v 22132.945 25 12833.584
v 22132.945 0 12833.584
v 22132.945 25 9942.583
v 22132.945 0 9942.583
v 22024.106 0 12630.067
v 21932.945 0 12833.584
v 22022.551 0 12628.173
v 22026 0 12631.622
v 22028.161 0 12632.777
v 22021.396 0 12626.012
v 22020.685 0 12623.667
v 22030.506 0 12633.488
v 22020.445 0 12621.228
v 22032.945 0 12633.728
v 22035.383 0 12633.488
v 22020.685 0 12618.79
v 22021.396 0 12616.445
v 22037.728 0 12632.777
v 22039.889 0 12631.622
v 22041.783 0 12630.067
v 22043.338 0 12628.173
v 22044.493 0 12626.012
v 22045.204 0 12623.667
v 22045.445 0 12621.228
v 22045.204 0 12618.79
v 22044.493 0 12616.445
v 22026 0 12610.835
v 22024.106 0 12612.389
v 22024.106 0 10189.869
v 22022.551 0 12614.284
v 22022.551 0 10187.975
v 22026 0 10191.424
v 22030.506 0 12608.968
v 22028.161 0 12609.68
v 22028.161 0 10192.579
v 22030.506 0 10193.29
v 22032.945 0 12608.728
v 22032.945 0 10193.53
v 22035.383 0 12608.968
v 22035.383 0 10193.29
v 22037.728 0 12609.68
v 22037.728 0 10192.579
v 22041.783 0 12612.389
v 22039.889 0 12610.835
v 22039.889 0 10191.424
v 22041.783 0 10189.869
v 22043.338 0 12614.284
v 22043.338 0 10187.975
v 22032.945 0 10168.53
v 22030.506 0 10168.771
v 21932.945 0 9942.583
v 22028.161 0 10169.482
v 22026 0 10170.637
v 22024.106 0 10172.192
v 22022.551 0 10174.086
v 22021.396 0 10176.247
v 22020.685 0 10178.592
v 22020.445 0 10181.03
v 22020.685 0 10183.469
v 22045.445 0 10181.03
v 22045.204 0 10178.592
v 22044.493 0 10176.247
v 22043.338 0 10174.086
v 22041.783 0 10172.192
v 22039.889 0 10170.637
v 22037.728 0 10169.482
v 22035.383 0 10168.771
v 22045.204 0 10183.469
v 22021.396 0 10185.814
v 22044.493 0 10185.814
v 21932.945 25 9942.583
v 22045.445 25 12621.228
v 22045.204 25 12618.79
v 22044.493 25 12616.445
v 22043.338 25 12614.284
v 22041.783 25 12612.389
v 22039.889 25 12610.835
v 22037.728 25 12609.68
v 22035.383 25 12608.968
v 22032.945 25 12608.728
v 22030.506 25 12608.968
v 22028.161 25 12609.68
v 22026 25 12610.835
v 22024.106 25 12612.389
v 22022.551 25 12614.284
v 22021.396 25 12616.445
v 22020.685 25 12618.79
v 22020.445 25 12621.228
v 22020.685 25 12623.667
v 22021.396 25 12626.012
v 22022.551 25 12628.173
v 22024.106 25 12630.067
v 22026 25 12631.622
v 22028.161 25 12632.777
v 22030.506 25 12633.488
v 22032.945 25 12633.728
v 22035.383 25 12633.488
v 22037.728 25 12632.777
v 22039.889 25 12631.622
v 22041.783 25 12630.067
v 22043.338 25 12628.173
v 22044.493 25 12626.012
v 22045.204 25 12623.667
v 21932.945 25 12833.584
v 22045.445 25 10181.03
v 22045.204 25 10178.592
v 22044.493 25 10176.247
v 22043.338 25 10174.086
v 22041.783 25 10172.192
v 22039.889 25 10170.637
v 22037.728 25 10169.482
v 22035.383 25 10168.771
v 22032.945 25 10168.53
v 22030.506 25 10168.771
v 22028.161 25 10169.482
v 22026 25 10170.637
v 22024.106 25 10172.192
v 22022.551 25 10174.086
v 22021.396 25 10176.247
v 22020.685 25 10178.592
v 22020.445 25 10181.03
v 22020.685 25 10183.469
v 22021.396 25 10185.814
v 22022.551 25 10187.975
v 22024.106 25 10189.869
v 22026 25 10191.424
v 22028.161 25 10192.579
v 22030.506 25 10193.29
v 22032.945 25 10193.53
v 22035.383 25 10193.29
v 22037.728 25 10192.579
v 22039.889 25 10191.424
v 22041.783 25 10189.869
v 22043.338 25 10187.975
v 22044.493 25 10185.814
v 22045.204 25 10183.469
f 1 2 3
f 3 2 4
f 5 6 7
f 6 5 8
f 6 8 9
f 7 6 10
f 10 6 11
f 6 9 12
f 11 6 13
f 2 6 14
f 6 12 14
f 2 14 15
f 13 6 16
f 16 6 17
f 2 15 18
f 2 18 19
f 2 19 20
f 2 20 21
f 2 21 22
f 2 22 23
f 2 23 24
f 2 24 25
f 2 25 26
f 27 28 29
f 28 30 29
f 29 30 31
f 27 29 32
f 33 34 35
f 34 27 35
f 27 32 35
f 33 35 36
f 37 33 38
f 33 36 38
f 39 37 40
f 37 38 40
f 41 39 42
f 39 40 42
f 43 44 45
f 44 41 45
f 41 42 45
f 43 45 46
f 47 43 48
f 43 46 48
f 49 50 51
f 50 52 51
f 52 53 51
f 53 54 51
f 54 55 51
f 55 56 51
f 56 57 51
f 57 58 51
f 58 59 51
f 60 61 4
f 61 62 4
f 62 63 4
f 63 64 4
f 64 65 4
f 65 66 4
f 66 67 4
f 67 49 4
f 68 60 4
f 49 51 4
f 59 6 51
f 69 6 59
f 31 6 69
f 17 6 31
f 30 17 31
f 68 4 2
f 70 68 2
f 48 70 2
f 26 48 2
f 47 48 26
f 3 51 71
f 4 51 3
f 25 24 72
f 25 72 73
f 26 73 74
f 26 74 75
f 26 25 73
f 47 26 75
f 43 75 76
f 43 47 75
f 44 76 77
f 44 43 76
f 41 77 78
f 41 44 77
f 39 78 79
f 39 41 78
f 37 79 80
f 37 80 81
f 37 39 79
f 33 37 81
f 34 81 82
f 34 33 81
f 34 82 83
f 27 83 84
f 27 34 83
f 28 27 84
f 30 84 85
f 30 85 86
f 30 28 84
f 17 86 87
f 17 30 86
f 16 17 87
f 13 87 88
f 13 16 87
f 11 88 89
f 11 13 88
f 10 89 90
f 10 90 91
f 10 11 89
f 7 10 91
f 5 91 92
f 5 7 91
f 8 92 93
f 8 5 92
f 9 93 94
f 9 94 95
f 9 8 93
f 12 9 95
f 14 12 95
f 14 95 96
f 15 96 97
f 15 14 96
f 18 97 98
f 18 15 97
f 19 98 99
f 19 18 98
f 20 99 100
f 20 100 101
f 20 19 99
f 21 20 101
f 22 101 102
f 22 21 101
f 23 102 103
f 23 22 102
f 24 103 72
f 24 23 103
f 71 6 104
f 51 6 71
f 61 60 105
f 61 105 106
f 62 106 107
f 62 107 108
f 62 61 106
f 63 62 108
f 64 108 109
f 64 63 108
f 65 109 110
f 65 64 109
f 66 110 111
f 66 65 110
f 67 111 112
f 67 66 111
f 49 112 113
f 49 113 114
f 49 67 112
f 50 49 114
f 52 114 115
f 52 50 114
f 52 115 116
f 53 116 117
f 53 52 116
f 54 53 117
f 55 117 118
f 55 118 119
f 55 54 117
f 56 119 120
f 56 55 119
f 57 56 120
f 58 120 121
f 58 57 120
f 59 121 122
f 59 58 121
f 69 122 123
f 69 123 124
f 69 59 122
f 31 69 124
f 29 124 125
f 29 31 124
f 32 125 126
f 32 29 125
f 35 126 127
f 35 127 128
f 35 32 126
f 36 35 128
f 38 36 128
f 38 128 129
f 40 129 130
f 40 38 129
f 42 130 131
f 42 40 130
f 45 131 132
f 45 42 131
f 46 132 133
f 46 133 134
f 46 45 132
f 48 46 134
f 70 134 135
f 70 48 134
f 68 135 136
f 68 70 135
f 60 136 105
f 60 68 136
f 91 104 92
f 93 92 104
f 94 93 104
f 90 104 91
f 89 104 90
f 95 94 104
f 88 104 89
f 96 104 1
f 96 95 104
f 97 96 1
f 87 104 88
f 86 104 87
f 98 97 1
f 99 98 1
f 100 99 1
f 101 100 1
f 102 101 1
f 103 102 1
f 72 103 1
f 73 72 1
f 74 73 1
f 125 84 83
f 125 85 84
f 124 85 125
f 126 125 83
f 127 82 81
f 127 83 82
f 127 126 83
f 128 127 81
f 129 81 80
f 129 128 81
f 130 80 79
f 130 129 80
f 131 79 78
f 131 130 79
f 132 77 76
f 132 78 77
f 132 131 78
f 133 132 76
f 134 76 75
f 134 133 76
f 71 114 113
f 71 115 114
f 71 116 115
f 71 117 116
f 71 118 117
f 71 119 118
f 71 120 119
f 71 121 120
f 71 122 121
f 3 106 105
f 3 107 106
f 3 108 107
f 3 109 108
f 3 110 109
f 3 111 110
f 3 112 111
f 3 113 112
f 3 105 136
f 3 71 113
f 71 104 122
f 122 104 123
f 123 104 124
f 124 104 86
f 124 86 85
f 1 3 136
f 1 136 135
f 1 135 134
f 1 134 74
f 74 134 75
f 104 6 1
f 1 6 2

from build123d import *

# Parameters (mm, degrees)
SKETCH4_W             = 200
SKETCH4_H             = 2933.573874127
SKETCH4_R             = 12.5
BOSS_EXTRUDE1_DEPTH   = 25
SKETCH4_H_2           = 2891.000919938
BOSS_EXTRUDE1_2_DEPTH = 25
SKETCH4_H_3           = 2656.8496719
BOSS_EXTRUDE1_3_DEPTH = 25
SKETCH4_H_4           = 2167.26069873
BOSS_EXTRUDE1_4_DEPTH = 25
SKETCH4_H_5           = 1693.636583381
BOSS_EXTRUDE1_5_DEPTH = 25
SKETCH5_W             = 4494.406695046
SKETCH5_H             = 4741.158435166
SKETCH5_W_2           = 1974.013920961
SKETCH5_H_2           = 6468.420616006
CUT_EXTRUDE1_DEPTH    = 10
SKETCH6_W             = 3512.97770999
SKETCH6_H             = 3727.07108035
SKETCH6_W_2           = 1146.73724468
SKETCH6_H_2           = 4594.268007597
CUT_EXTRUDE2_DEPTH    = 26


with BuildPart() as part:
    # Sketch4 → Boss-Extrude1 (new body)
    with BuildSketch(Plane(origin=(0, 0, 0), x_dir=(1, 0, 0), z_dir=(0, 1, 0))):
        with Locations((23132.944645813, -11409.369811035)):
            Rectangle(SKETCH4_W, SKETCH4_H)
        with Locations((23132.944645813, -12678.089615367)):
            Circle(SKETCH4_R, mode=Mode.SUBTRACT)
        with Locations((23132.944645813, -10181.030459334)):
            Circle(SKETCH4_R, mode=Mode.SUBTRACT)
    extrude(amount=BOSS_EXTRUDE1_DEPTH)


with BuildPart() as body_2:
    # Sketch4 → Boss-Extrude1 2 (new body)
    with BuildSketch(Plane(origin=(0, 0, 0), x_dir=(1, 0, 0), z_dir=(0, 1, 0))):
        with Locations((22032.944645813, -11388.083333941)):
            Rectangle(SKETCH4_W, SKETCH4_H_2)
        with Locations((22032.944645813, -12621.228285175)):
            Circle(SKETCH4_R, mode=Mode.SUBTRACT)
        with Locations((22032.944645813, -10181.030459334)):
            Circle(SKETCH4_R, mode=Mode.SUBTRACT)
    extrude(amount=BOSS_EXTRUDE1_2_DEPTH)


with BuildPart() as body_3:
    # Sketch4 → Boss-Extrude1 3 (new body)
    with BuildSketch(Plane(origin=(0, 0, 0), x_dir=(1, 0, 0), z_dir=(0, 1, 0))):
        with Locations((20832.944645813, -11271.007709922)):
            Rectangle(SKETCH4_W, SKETCH4_H_3)
        with Locations((20832.944645813, -12348.754240871)):
            Circle(SKETCH4_R, mode=Mode.SUBTRACT)
        with Locations((20832.944645813, -10181.030459334)):
            Circle(SKETCH4_R, mode=Mode.SUBTRACT)
    extrude(amount=BOSS_EXTRUDE1_3_DEPTH)


with BuildPart() as body_4:
    # Sketch4 → Boss-Extrude1 4 (new body)
    with BuildSketch(Plane(origin=(0, 0, 0), x_dir=(1, 0, 0), z_dir=(0, 1, 0))):
        with Locations((19632.944645813, -11026.213223337)):
            Rectangle(SKETCH4_W, SKETCH4_H_4)
        with Locations((19632.944645813, -11826.915448153)):
            Circle(SKETCH4_R, mode=Mode.SUBTRACT)
        with Locations((19632.944645813, -10181.030459334)):
            Circle(SKETCH4_R, mode=Mode.SUBTRACT)
    extrude(amount=BOSS_EXTRUDE1_4_DEPTH)


with BuildPart() as body_5:
    # Sketch4 → Boss-Extrude1 5 (new body)
    with BuildSketch(Plane(origin=(0, 0, 0), x_dir=(1, 0, 0), z_dir=(0, 1, 0))):
        with Locations((18802.944645813, -10789.401165663)):
            Rectangle(SKETCH4_W, SKETCH4_H_5)
        with Locations((18802.944645813, -11283.669778774)):
            Circle(SKETCH4_R, mode=Mode.SUBTRACT)
        with Locations((18802.944645813, -10181.030459334)):
            Circle(SKETCH4_R, mode=Mode.SUBTRACT)
    extrude(amount=BOSS_EXTRUDE1_5_DEPTH)


with BuildPart() as cut_extrude1_tool:
    # Sketch5 → Cut-Extrude1 (new body)
    with BuildSketch(Plane(origin=(0, 0, 0), x_dir=(1, 0, 0), z_dir=(0, 1, 0))):
        with Locations((19231.869902825, -10968.741703678)):
            Rectangle(SKETCH5_W, SKETCH5_H)
        with Locations((23594.088165664, -11444.620059624)):
            Rectangle(SKETCH5_W_2, SKETCH5_H_2)
    extrude(amount=CUT_EXTRUDE1_DEPTH)


with BuildPart() as part_1:
    add(part.part)

    # Cut-Extrude1: cut by cut_extrude1_tool
    add(cut_extrude1_tool.part, mode=Mode.SUBTRACT)


with BuildPart() as body_3_1:
    add(body_3.part)

    # Cut-Extrude1: cut by cut_extrude1_tool
    add(cut_extrude1_tool.part, mode=Mode.SUBTRACT)


with BuildPart() as body_4_1:
    add(body_4.part)

    # Cut-Extrude1: cut by cut_extrude1_tool
    add(cut_extrude1_tool.part, mode=Mode.SUBTRACT)


with BuildPart() as body_5_1:
    add(body_5.part)

    # Cut-Extrude1: cut by cut_extrude1_tool
    add(cut_extrude1_tool.part, mode=Mode.SUBTRACT)


with BuildPart() as cut_extrude2_tool:
    # Sketch6 → Cut-Extrude2 (new body, through all)
    with BuildSketch(Plane(origin=(0, 0, 0), x_dir=(1, 0, 0), z_dir=(0, 1, 0))):
        with Locations((19642.924182274, -11343.935947445)):
            Rectangle(SKETCH6_W, SKETCH6_H)
        with Locations((23195.80267331, -11003.734808489)):
            Rectangle(SKETCH6_W_2, SKETCH6_H_2)
    extrude(amount=CUT_EXTRUDE2_DEPTH)


with BuildPart() as part_2:
    add(part_1.part)

    # Cut-Extrude2: cut by cut_extrude2_tool
    add(cut_extrude2_tool.part, mode=Mode.SUBTRACT)


with BuildPart() as body_3_2:
    add(body_3_1.part)

    # Cut-Extrude2: cut by cut_extrude2_tool
    add(cut_extrude2_tool.part, mode=Mode.SUBTRACT)


with BuildPart() as body_4_2:
    add(body_4_1.part)

    # Cut-Extrude2: cut by cut_extrude2_tool
    add(cut_extrude2_tool.part, mode=Mode.SUBTRACT)


with BuildPart() as body_5_2:
    add(body_5_1.part)

    # Cut-Extrude2: cut by cut_extrude2_tool
    add(cut_extrude2_tool.part, mode=Mode.SUBTRACT)


solid = body_2.part
